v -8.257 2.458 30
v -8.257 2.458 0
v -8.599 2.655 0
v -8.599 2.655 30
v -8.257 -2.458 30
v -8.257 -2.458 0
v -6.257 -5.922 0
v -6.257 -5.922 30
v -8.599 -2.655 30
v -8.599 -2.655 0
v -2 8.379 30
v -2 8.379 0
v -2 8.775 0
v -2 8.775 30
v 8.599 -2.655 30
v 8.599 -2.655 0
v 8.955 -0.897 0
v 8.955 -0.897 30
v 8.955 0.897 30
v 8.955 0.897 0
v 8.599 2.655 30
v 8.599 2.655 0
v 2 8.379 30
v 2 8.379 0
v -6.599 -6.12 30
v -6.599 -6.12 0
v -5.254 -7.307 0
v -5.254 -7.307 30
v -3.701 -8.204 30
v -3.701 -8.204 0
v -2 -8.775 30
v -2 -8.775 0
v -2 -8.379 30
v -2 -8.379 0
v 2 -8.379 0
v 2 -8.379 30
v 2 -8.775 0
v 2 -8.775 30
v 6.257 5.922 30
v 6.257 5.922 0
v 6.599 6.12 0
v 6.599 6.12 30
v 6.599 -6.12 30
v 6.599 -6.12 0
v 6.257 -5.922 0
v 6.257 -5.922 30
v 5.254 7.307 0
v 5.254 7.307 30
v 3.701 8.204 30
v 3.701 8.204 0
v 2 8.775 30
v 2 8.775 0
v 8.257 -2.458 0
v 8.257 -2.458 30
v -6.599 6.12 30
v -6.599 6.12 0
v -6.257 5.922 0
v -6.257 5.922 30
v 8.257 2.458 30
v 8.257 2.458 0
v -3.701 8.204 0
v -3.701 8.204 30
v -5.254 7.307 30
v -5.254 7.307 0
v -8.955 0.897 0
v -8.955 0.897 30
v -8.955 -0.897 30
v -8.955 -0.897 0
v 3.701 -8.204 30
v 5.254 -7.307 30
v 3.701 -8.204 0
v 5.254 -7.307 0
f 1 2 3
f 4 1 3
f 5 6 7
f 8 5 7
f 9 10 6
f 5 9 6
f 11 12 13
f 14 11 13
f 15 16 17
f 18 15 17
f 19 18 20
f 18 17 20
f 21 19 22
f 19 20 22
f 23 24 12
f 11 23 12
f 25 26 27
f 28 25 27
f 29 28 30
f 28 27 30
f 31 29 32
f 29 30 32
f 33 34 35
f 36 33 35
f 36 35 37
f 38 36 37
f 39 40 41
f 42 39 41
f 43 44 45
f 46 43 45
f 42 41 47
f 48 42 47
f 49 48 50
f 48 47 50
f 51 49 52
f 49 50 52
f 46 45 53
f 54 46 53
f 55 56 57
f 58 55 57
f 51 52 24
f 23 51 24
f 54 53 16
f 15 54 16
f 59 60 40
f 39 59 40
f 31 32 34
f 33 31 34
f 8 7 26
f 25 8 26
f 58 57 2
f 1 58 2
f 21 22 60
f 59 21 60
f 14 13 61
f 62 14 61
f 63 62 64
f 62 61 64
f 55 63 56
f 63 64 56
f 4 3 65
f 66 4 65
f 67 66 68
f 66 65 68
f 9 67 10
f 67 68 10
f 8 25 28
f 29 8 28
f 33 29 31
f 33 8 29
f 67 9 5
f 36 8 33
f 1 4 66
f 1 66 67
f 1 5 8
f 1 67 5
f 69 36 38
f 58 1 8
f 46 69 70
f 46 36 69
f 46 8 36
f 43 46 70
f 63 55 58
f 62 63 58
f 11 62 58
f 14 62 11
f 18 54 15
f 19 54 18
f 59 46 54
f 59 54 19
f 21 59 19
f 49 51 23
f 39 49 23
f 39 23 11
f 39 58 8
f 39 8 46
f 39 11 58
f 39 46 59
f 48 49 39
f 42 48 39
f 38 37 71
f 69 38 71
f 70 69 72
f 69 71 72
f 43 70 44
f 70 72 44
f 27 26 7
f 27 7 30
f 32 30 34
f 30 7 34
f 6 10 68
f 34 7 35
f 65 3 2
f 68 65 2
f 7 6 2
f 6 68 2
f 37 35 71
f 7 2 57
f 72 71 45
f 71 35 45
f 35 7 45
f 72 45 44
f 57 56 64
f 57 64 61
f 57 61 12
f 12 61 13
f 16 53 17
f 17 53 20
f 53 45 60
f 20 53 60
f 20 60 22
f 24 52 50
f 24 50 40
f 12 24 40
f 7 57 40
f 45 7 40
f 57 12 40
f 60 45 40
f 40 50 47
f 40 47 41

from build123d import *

# Parameters (mm, degrees)
F1_DEPTH = 30


with BuildPart() as f1:
    # F0 (on Top) → F1 (new body)
    with BuildSketch(Plane.XY):
        with BuildLine():
            Line((2, -8.379183), (2, -8.774964))
            ThreePointArc((2, -8.774964), (4.5, -7.794229), (6.599342, -6.119533))
            Line((6.599342, -6.119533), (6.256585, -5.921642))
            Line((6.256585, -5.921642), (8.256585, -2.457541))
            Line((8.256585, -2.457541), (8.599342, -2.655431))
            ThreePointArc((8.599342, -2.655431), (9, 0), (8.599342, 2.655431))
            Line((8.599342, 2.655431), (8.256585, 2.457541))
            Line((8.256585, 2.457541), (6.256585, 5.921642))
            Line((6.256585, 5.921642), (6.599342, 6.119533))
            ThreePointArc((6.599342, 6.119533), (4.5, 7.794229), (2, 8.774964))
            Line((2, 8.774964), (2, 8.379183))
            Line((2, 8.379183), (-2, 8.379183))
            Line((-2, 8.379183), (-2, 8.774964))
            ThreePointArc((-2, 8.774964), (-4.5, 7.794229), (-6.599342, 6.119533))
            Line((-6.599342, 6.119533), (-6.256585, 5.921642))
            Line((-6.256585, 5.921642), (-8.256585, 2.457541))
            Line((-8.256585, 2.457541), (-8.599342, 2.655431))
            ThreePointArc((-8.599342, 2.655431), (-9, 0), (-8.599342, -2.655431))
            Line((-8.599342, -2.655431), (-8.256585, -2.457541))
            Line((-8.256585, -2.457541), (-6.256585, -5.921642))
            Line((-6.256585, -5.921642), (-6.599342, -6.119533))
            ThreePointArc((-6.599342, -6.119533), (-4.5, -7.794229), (-2, -8.774964))
            Line((-2, -8.774964), (-2, -8.379183))
            Line((-2, -8.379183), (2, -8.379183))
        make_face()
    extrude(amount=F1_DEPTH)


solid = f1.part
